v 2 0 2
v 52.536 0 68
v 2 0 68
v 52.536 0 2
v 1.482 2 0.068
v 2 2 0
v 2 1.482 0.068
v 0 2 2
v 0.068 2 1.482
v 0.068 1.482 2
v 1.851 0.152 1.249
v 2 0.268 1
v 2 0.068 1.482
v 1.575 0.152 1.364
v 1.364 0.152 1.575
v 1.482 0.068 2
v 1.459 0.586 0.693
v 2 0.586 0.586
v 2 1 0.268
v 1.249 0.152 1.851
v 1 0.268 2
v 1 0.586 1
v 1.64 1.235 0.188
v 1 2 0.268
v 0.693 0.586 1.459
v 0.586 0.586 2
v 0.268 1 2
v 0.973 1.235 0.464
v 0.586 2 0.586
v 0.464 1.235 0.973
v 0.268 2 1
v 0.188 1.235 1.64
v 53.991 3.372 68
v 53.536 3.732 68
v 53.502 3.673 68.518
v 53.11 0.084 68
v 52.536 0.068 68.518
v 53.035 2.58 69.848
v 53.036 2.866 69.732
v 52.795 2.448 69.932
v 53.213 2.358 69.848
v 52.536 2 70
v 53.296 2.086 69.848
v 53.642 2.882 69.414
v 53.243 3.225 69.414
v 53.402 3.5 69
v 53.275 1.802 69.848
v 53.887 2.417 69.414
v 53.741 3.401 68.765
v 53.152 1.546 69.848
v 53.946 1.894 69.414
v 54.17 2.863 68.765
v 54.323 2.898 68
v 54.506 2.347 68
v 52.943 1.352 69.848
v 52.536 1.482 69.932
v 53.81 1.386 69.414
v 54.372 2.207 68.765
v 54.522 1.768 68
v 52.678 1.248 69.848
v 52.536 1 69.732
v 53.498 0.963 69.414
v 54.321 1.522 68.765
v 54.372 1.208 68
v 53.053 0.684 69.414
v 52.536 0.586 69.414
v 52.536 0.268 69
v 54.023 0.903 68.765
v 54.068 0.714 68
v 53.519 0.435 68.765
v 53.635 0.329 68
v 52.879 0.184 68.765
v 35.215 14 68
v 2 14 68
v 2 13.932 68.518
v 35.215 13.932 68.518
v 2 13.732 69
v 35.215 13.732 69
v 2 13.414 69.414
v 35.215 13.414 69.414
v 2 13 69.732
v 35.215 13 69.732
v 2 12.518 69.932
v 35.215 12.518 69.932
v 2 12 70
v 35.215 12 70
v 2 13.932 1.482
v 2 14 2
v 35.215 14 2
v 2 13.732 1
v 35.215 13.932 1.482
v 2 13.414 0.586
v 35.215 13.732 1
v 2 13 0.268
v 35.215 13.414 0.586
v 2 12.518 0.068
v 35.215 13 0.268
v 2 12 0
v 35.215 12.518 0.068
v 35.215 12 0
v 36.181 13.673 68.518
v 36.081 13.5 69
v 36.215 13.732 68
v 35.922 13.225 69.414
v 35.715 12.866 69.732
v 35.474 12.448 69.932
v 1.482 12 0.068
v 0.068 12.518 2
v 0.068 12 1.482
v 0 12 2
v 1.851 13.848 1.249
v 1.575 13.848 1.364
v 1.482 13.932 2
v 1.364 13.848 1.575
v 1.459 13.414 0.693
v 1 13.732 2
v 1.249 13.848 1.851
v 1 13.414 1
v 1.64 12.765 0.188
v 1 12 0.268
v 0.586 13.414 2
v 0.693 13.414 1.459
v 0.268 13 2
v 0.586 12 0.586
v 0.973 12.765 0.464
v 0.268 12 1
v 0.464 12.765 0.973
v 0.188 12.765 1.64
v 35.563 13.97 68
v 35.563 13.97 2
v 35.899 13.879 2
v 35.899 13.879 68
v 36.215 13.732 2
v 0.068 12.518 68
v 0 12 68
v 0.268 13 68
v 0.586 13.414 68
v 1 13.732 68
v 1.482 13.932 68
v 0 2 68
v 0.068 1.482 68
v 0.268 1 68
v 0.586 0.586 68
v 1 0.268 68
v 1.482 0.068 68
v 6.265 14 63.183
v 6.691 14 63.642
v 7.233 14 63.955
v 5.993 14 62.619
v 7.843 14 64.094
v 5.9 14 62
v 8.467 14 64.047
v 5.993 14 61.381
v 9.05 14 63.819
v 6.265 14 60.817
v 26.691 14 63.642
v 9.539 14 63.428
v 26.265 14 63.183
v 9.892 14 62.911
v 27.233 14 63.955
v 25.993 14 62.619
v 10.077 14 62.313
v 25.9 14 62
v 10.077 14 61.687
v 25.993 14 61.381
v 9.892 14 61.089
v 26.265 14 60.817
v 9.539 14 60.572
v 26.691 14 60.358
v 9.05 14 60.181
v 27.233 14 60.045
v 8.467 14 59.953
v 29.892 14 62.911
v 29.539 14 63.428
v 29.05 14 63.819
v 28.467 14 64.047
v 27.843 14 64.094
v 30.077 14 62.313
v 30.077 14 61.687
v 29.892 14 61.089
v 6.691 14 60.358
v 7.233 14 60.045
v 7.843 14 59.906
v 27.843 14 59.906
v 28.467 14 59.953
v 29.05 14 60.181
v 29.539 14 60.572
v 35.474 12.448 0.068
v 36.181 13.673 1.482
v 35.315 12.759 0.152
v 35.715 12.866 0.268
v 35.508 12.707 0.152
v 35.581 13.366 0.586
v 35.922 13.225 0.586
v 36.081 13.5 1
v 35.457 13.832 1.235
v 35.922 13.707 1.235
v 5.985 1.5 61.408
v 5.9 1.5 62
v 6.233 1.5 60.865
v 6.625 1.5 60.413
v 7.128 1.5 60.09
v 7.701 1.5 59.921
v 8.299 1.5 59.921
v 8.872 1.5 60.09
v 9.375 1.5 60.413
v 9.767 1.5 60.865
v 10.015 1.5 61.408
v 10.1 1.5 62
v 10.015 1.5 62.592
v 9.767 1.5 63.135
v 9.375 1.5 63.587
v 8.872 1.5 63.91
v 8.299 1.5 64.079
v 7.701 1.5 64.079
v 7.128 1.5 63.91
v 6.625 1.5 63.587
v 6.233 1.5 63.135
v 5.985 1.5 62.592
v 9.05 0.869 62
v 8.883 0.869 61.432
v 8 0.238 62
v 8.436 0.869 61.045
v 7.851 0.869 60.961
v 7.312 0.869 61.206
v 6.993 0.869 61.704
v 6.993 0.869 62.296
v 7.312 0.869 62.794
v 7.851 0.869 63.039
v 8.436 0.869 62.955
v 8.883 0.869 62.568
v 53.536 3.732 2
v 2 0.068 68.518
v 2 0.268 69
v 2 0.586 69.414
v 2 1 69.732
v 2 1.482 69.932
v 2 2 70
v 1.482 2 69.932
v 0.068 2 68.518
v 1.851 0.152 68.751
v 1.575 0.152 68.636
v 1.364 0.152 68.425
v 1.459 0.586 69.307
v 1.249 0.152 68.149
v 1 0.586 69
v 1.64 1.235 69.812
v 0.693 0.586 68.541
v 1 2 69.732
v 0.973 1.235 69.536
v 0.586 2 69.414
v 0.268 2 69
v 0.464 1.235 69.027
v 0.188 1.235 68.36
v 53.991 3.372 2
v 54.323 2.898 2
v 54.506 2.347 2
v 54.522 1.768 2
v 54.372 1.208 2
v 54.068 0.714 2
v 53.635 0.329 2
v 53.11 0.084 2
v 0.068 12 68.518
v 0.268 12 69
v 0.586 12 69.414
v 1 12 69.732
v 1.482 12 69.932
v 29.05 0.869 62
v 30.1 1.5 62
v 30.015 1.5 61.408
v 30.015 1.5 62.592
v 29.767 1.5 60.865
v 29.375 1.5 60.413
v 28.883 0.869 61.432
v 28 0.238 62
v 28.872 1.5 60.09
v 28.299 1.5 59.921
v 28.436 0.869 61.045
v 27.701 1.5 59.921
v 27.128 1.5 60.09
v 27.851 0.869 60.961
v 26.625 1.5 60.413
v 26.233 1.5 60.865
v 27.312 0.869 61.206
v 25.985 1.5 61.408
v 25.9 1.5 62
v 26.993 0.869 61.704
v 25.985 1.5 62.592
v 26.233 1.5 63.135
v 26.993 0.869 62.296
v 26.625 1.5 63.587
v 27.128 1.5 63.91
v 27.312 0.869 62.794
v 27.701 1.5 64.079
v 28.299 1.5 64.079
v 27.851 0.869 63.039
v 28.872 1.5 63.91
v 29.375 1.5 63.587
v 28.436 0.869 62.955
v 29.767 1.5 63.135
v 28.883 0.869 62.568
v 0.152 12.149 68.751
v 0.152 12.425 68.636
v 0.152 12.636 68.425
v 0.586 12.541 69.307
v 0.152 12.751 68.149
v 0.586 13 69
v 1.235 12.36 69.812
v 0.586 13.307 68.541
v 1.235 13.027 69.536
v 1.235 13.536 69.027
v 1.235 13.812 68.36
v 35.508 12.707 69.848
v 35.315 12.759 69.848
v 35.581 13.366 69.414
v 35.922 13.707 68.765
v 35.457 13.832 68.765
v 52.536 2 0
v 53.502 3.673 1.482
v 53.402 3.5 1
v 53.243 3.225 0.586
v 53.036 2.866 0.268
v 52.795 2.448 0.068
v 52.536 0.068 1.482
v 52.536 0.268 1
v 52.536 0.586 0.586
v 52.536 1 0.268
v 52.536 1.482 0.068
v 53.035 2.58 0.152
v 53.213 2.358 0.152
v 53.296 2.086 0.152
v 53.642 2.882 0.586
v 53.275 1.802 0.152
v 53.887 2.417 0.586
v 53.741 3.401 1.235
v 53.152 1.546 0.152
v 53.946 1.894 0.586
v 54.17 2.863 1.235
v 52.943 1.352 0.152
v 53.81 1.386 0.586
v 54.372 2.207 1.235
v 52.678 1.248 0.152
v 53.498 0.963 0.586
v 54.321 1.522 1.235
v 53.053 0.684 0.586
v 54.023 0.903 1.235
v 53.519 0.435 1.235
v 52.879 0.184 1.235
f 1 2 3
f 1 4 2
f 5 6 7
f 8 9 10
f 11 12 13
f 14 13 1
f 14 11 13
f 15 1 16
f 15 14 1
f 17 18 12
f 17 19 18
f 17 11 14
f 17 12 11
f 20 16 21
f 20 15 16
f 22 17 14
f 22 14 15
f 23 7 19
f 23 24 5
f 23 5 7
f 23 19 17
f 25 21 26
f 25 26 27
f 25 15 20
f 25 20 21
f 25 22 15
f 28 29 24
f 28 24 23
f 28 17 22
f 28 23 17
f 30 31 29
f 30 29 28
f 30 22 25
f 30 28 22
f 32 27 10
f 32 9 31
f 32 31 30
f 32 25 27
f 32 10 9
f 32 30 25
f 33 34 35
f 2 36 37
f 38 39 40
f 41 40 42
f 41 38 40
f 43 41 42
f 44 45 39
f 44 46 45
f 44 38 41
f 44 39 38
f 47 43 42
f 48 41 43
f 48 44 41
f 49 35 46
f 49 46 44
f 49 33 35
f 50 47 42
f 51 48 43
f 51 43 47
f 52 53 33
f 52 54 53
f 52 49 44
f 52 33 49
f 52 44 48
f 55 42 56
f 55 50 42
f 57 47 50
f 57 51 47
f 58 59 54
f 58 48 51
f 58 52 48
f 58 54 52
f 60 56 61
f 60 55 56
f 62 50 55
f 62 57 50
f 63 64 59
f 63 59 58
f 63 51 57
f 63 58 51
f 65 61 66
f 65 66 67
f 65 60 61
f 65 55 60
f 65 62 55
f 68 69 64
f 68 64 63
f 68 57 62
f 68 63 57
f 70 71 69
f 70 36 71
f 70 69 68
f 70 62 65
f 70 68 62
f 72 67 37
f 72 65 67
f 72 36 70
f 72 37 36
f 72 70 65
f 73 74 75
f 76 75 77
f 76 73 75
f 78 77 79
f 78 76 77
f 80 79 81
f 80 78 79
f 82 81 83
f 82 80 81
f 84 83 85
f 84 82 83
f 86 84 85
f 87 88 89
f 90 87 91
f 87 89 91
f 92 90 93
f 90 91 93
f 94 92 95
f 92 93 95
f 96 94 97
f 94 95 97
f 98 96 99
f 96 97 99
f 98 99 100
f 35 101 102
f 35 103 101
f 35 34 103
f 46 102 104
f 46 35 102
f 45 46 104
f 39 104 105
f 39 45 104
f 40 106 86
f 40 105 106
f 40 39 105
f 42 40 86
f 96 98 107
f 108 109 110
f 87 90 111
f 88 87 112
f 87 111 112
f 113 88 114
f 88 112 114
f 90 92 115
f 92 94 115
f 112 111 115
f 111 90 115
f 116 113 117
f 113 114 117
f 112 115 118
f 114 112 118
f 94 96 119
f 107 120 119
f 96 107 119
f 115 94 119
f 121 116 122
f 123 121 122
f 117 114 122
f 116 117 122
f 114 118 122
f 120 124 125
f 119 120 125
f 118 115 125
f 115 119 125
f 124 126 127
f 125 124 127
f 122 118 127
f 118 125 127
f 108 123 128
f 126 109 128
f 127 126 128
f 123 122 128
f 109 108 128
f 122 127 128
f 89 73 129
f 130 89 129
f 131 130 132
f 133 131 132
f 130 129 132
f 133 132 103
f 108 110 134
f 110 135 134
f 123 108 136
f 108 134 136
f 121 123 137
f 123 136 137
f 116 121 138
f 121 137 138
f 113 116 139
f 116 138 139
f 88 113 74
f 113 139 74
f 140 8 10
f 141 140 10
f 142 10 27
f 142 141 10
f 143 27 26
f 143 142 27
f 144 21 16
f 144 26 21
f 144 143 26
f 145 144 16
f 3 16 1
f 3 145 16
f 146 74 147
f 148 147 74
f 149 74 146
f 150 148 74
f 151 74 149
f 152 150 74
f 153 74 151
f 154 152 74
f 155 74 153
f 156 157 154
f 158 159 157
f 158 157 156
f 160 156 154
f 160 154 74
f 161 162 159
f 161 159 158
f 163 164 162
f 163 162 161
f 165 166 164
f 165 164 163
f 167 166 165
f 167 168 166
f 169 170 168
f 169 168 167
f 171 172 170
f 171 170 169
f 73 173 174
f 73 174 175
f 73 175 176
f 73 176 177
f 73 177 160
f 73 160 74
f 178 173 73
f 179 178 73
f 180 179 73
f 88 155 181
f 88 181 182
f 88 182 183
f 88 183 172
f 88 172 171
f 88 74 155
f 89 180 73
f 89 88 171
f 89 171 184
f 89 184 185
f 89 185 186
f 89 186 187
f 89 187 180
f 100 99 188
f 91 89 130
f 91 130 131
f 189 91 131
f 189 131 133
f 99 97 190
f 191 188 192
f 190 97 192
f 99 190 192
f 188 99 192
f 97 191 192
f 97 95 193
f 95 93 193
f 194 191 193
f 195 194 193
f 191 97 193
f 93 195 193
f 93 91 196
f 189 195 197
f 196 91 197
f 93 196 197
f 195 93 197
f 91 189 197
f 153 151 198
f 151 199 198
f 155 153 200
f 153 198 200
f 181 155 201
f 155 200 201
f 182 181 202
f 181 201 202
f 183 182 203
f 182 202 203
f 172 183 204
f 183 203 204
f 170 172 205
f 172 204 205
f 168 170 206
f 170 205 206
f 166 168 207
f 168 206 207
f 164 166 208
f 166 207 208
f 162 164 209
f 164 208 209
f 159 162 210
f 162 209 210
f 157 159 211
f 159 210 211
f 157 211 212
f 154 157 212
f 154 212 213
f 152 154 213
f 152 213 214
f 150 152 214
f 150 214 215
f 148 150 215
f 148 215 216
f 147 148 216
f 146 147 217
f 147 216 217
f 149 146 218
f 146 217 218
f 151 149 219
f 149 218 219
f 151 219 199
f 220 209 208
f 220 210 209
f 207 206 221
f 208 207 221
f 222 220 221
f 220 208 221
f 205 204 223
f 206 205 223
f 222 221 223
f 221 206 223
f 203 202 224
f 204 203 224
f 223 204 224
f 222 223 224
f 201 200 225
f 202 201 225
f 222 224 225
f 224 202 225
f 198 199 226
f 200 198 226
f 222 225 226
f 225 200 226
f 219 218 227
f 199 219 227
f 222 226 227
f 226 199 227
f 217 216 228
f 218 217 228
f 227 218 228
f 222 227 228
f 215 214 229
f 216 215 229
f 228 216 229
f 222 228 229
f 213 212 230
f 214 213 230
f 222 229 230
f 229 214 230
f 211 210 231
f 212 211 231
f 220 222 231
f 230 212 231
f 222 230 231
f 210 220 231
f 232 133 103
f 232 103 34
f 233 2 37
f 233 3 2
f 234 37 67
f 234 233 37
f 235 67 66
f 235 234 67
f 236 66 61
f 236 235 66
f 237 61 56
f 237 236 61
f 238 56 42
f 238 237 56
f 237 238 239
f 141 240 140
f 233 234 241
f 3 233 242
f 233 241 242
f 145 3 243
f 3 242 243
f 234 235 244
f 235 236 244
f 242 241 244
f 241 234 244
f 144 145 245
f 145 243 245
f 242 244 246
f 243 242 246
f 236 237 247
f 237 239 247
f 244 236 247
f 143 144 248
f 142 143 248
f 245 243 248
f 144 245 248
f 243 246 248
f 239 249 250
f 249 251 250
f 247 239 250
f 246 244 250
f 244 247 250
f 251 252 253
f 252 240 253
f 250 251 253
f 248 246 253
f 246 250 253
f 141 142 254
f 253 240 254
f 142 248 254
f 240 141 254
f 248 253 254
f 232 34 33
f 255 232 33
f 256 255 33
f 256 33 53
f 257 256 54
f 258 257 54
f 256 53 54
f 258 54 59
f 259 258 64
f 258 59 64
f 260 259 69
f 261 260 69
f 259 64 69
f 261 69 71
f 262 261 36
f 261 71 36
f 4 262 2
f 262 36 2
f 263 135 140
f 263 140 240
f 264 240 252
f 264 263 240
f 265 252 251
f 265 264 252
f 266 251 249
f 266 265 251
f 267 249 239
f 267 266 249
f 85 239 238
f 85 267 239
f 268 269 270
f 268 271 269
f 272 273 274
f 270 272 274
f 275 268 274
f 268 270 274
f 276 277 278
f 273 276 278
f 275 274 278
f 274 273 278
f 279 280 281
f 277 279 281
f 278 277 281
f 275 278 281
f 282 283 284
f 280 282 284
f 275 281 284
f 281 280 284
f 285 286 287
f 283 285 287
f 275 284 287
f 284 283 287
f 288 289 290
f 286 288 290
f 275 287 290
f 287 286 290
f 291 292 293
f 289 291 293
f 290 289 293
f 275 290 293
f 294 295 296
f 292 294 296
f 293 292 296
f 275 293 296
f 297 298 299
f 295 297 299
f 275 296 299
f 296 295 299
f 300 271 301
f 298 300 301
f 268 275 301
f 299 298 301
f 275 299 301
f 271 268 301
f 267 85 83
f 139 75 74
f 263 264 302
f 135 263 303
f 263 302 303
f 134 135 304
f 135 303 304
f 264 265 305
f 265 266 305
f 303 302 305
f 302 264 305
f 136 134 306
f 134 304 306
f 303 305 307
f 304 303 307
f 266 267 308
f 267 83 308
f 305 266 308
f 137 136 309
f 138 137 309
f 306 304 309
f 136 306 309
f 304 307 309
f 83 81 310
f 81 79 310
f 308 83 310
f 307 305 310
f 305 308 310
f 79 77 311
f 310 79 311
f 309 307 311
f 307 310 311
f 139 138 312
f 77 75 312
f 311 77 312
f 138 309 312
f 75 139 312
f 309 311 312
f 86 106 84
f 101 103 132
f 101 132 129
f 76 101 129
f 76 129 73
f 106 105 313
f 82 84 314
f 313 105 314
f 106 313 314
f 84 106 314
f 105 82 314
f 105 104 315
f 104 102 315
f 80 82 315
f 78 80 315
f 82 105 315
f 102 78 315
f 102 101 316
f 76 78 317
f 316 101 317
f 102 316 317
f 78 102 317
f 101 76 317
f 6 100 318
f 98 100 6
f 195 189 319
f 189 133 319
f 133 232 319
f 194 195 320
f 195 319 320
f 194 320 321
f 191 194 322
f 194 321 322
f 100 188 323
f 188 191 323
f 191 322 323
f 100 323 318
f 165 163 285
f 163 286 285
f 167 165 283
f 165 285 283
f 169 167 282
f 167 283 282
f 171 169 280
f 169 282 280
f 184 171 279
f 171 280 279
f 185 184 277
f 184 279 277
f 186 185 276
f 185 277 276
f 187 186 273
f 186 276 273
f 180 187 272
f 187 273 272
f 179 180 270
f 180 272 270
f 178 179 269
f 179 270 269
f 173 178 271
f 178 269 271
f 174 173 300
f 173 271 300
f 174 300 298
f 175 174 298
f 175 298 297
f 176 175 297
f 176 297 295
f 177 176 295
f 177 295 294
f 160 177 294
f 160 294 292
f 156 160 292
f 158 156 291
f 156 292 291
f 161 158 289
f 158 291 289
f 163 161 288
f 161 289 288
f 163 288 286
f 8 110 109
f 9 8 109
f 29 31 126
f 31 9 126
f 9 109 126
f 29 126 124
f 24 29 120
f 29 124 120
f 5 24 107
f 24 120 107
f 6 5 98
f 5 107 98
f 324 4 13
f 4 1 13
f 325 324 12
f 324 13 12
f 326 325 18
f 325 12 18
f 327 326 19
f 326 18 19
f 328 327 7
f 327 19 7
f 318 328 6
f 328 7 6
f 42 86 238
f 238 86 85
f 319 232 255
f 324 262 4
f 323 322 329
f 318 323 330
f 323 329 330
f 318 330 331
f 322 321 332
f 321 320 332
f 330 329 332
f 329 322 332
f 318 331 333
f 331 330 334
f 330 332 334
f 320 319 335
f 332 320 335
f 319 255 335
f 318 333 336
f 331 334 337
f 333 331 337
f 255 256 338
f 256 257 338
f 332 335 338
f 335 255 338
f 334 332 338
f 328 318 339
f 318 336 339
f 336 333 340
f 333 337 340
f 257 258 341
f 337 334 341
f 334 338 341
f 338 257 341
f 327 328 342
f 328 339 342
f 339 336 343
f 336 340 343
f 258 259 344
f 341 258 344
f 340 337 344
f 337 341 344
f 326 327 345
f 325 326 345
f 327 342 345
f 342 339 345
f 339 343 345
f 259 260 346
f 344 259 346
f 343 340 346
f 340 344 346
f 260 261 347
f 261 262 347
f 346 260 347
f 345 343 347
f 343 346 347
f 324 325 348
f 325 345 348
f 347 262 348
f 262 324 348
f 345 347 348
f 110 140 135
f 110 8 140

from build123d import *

# Parameters (mm, degrees)
BOSS_EXTRUDE1_DEPTH   = 70
FILLET1_R             = 2
M5_TAPPED_HOLE1_D     = 4.2
M5_TAPPED_HOLE1_DEPTH = 12.5
M5_TAPPED_HOLE1_TIP   = 1.2618073


with BuildPart() as part:
    # Sketch1 → Boss-Extrude1 (new body)
    with BuildSketch(Plane.XY):
        Polygon((0, 0), (0, 14), (35.751288694, 14), (60, 0), align=None)
    extrude(amount=BOSS_EXTRUDE1_DEPTH)

    # Fillet1
    fillet1_edges = [part.edges().sort_by_distance(p)[0] for p in [
        (17.875644347, 14, 70),
        (0, 7, 70),
        (30, 0, 70),
        (0, 7, 0),
        (17.875644347, 14, 0),
        (47.875644347, 7, 0),
        (30, 0, 0),
        (0, 0, 35),
        (0, 14, 35),
        (35.751288694, 14, 35),
        (60, 0, 35),
        (47.875644347, 7, 70),
    ]]
    fillet(fillet1_edges, radius=FILLET1_R)

    # M5 Tapped Hole1
    with Locations(Plane(origin=(0, 14, 0), x_dir=(1, 0, 0), z_dir=(0, 1, 0))):
        with Locations((8, -62), (28, -62)):
            Hole(M5_TAPPED_HOLE1_D / 2, depth=M5_TAPPED_HOLE1_DEPTH)
            with Locations((0, 0, -(M5_TAPPED_HOLE1_DEPTH + M5_TAPPED_HOLE1_TIP / 2))):  # 118° drill point
                Cone(0, M5_TAPPED_HOLE1_D / 2, M5_TAPPED_HOLE1_TIP, mode=Mode.SUBTRACT)


solid = part.part
